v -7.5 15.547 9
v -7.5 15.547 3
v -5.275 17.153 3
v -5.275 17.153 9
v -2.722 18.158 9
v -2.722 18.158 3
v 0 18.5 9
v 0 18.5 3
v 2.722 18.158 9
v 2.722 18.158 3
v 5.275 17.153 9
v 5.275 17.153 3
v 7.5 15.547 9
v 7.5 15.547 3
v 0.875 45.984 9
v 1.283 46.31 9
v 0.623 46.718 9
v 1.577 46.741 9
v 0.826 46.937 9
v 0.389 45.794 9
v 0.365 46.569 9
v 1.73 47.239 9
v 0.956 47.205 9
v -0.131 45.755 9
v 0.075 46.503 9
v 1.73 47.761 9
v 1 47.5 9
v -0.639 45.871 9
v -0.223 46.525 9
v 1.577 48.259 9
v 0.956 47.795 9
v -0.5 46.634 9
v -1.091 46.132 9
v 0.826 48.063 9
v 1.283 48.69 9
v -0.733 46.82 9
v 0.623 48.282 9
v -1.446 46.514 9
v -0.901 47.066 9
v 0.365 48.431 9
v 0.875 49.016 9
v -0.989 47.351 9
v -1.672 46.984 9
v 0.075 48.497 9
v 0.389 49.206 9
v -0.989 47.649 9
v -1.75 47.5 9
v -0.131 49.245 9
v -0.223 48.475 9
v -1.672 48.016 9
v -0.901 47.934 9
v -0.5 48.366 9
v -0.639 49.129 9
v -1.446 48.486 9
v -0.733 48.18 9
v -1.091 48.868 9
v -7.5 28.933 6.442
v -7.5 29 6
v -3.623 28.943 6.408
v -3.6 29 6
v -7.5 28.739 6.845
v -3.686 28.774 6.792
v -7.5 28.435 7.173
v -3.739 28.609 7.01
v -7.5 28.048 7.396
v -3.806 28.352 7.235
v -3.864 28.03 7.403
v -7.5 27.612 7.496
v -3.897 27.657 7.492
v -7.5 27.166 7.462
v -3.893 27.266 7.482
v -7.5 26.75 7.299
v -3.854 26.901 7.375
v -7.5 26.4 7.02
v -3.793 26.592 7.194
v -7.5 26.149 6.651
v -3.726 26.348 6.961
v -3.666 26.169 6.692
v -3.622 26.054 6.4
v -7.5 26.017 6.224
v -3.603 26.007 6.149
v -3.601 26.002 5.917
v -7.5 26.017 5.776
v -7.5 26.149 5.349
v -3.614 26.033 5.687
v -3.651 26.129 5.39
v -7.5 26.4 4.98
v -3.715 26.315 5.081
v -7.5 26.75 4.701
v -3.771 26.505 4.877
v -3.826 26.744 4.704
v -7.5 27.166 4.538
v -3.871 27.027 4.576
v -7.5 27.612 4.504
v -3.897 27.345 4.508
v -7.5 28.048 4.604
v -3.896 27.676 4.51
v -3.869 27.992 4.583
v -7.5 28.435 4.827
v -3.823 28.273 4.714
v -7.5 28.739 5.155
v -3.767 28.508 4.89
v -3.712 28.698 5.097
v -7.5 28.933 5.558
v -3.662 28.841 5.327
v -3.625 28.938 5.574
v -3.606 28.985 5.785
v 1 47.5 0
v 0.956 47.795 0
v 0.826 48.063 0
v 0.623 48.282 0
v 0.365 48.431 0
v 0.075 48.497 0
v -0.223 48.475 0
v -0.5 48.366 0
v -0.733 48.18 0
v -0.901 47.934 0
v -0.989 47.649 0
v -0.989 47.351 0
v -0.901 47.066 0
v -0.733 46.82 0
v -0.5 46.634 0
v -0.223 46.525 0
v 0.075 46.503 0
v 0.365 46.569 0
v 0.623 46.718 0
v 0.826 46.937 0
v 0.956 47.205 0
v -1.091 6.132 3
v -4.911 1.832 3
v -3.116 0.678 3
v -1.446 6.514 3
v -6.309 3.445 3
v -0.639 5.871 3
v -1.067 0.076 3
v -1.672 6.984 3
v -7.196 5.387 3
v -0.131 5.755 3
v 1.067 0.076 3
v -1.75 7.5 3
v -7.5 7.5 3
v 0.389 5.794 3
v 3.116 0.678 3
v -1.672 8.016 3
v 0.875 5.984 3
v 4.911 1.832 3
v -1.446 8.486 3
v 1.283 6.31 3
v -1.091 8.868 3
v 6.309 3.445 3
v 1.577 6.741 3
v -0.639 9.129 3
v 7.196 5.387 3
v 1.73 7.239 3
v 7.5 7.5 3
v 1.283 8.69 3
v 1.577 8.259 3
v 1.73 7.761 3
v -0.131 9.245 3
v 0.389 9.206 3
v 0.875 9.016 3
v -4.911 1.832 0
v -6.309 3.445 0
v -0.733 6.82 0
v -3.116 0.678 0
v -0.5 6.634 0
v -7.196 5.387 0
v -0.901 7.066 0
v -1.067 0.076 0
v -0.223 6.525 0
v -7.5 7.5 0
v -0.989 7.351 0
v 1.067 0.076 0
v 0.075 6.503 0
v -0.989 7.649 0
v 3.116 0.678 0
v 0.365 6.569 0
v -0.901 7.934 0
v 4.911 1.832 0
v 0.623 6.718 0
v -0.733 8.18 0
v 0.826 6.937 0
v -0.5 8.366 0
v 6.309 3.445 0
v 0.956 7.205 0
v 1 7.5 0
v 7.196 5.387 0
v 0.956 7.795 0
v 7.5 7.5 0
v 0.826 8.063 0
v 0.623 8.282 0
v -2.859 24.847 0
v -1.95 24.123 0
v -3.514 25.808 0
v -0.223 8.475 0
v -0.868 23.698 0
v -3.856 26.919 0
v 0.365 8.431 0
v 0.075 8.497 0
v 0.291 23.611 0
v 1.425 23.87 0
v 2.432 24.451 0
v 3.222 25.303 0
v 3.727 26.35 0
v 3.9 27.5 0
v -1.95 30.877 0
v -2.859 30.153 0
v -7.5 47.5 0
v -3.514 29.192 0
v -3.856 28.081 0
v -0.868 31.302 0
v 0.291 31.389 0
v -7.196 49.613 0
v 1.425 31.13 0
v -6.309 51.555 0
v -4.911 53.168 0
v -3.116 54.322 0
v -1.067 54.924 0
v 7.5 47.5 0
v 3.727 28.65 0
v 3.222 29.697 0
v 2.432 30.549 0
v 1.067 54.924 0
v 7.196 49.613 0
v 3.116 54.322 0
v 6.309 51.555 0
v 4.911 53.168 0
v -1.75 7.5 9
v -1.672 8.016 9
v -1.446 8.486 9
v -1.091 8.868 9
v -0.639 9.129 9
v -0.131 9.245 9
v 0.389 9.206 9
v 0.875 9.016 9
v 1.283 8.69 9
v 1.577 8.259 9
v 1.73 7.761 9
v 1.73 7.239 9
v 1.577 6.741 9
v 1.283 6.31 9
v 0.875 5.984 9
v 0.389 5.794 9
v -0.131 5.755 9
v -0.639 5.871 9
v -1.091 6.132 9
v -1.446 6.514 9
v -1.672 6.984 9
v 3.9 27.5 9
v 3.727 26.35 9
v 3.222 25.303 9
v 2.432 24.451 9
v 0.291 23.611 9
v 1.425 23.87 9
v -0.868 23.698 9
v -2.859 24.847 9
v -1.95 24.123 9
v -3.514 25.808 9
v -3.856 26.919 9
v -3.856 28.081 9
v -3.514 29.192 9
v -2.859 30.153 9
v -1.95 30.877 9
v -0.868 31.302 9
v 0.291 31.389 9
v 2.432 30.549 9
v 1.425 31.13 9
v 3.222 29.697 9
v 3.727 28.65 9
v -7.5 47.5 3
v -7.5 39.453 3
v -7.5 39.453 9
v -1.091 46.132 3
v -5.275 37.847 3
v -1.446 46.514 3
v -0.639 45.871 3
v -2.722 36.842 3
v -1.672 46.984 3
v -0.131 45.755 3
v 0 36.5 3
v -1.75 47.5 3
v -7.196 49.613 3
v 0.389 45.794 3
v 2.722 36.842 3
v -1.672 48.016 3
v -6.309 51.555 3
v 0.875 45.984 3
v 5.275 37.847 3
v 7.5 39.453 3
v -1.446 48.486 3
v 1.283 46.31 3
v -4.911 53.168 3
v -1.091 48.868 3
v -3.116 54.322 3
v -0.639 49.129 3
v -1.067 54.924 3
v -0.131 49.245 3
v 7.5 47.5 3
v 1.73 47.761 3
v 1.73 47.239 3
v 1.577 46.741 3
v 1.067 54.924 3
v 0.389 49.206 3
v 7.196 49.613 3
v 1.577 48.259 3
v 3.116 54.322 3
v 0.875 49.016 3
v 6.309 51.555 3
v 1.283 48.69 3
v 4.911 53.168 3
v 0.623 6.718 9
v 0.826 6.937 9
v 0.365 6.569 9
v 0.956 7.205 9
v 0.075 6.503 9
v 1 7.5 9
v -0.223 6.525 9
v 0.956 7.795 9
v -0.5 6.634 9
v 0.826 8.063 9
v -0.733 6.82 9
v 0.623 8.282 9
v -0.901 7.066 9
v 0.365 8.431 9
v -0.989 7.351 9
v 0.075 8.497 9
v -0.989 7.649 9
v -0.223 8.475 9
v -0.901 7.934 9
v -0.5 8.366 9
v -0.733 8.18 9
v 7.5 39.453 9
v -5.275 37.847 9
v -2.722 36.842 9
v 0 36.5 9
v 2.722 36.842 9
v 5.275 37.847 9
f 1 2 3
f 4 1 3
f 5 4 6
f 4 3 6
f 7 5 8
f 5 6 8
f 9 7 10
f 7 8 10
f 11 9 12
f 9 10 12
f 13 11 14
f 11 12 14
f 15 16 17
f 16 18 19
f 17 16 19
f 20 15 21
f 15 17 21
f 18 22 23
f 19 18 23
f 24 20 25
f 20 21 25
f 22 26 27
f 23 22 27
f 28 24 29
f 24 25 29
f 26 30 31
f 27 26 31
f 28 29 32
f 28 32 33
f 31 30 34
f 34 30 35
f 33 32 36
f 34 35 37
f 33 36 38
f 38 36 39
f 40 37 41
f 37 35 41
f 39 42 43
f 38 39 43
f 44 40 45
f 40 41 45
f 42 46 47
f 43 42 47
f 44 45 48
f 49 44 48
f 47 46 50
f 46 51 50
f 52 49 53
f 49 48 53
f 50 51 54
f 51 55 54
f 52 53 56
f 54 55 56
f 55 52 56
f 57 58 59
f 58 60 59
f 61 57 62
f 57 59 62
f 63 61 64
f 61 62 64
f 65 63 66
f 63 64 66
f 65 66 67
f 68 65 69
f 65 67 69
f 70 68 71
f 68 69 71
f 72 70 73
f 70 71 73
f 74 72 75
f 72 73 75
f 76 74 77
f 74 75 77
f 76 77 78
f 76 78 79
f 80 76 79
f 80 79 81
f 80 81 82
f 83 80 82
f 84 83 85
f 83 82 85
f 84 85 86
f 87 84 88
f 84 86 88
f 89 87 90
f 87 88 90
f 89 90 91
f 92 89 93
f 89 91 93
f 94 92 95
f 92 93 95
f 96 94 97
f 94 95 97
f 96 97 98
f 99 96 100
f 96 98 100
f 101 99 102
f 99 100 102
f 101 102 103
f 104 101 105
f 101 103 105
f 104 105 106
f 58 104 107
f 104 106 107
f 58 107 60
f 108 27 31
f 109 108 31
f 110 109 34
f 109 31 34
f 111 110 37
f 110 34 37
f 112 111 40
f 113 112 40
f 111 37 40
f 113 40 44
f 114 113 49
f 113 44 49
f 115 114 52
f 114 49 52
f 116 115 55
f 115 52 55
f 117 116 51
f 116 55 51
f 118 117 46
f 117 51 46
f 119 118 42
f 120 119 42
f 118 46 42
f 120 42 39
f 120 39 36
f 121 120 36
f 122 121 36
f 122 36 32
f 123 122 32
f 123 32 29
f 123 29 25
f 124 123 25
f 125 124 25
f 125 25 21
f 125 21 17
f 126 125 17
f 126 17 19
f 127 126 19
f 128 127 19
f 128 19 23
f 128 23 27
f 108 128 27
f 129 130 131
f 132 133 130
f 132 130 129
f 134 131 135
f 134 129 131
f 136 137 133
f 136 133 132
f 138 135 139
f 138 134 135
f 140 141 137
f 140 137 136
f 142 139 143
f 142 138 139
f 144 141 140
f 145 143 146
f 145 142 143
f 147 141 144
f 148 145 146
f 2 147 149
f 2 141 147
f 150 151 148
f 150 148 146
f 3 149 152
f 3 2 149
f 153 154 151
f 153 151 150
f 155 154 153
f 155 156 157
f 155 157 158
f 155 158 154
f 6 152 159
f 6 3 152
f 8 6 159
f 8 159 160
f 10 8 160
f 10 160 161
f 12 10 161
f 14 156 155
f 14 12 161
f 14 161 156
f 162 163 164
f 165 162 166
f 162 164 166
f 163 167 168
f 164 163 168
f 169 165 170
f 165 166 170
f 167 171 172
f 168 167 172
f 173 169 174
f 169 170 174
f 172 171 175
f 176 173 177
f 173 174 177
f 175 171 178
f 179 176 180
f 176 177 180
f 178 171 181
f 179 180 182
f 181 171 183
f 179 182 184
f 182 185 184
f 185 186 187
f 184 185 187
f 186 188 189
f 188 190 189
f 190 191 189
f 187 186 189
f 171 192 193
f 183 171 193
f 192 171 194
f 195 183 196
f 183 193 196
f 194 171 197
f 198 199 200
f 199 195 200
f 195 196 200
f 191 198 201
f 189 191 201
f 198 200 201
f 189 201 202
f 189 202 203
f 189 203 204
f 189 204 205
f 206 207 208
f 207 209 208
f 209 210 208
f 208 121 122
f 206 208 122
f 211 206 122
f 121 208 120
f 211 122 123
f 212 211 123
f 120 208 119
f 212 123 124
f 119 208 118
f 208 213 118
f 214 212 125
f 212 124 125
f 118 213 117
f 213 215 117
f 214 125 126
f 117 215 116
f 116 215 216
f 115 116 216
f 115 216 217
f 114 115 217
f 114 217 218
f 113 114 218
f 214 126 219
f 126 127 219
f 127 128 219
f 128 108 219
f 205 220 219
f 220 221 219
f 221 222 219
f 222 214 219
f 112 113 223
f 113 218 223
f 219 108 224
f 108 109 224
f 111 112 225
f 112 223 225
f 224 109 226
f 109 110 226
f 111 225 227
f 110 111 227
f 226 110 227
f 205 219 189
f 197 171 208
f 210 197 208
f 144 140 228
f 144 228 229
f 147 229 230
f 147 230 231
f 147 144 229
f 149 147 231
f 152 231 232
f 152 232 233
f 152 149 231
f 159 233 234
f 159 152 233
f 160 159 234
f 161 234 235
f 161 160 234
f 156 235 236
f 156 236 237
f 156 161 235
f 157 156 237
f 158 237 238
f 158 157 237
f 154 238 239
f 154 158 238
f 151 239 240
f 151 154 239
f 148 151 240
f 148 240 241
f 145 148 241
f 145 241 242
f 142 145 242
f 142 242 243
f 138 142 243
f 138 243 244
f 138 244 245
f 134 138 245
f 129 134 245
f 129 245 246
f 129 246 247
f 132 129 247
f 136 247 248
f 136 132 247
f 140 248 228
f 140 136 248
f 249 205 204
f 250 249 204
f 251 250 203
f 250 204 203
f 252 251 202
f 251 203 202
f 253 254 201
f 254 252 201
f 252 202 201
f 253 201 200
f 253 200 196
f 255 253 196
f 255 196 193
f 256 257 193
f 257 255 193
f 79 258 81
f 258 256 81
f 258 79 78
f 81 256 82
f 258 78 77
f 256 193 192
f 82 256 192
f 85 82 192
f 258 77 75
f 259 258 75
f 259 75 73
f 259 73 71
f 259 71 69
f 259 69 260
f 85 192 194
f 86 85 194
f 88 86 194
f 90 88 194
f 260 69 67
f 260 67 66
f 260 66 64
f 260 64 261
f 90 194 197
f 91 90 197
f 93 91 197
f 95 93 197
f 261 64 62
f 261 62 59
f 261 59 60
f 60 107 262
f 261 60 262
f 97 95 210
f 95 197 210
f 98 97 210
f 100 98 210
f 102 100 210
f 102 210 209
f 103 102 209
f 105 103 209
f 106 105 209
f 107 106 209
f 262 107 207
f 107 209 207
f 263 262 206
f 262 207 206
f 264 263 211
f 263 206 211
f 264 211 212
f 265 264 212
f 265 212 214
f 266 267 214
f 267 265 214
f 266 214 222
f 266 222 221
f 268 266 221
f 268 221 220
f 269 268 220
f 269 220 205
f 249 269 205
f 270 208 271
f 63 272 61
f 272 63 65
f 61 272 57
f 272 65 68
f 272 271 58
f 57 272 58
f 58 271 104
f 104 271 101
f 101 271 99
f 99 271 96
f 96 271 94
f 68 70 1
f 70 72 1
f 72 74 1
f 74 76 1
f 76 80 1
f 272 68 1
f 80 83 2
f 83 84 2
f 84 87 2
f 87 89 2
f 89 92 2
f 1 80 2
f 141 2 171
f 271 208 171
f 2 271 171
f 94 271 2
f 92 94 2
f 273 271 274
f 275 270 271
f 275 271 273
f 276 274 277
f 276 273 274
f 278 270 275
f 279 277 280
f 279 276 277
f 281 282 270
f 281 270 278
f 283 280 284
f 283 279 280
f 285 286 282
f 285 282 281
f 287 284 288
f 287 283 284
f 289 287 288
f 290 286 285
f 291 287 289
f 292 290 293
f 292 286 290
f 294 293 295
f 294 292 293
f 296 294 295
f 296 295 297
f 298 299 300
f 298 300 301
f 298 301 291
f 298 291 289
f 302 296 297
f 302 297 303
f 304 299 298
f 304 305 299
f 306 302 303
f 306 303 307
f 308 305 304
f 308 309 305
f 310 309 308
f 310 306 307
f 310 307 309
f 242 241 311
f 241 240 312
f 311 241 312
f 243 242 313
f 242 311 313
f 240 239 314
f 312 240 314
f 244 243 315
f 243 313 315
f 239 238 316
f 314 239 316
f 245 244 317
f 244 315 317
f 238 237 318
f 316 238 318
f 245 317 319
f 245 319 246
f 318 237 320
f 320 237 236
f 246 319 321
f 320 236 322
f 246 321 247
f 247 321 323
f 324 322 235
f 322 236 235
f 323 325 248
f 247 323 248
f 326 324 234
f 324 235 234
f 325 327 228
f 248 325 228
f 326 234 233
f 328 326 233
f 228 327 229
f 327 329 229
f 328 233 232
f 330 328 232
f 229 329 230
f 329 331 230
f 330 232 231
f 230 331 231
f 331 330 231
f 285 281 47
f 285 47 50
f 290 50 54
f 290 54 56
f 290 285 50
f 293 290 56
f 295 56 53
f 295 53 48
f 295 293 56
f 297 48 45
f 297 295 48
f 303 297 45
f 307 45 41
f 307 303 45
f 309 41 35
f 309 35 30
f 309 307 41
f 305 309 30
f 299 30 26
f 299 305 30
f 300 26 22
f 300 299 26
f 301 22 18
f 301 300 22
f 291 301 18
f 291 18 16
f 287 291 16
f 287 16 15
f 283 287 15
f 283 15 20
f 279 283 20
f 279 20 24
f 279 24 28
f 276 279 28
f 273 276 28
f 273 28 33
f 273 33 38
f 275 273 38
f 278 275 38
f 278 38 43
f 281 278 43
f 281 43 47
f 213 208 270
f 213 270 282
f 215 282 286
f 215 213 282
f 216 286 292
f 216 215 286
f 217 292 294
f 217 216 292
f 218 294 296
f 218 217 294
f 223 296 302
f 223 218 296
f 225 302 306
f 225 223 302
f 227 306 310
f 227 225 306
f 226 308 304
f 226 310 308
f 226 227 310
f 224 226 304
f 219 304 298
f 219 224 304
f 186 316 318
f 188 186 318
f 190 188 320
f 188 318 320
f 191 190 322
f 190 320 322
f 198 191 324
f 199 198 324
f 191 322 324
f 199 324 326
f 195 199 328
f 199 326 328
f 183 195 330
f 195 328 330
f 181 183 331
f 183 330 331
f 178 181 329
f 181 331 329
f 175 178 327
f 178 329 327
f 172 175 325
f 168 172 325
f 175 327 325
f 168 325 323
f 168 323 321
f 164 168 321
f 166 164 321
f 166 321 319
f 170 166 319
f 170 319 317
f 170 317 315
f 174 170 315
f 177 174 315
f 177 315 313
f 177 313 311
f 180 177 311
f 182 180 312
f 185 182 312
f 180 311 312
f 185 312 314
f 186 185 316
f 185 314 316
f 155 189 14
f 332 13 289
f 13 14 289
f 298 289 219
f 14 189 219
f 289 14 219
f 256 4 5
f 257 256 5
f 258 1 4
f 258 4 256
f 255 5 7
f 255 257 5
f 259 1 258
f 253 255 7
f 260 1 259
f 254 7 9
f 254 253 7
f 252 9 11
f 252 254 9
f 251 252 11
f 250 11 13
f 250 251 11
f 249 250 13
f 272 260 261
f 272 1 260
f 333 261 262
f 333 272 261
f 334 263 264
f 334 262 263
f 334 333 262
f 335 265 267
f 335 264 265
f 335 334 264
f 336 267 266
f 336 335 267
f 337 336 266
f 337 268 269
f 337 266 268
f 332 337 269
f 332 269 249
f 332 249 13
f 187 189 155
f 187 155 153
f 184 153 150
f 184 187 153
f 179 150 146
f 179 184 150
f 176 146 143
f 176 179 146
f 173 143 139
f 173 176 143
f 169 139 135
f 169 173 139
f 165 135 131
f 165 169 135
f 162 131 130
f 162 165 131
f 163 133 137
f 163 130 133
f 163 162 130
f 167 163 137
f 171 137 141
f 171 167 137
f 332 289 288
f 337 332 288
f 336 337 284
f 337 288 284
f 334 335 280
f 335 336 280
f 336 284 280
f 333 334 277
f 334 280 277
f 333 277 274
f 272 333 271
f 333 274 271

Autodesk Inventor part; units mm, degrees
ref_plane "YZ Plane" through (0, 0, 0) normal (1, 0, 0) x (0, 1, 0)
ref_plane "XZ Plane" through (0, 0, 0) normal (0, 1, 0) x (-1, 0, 0)
ref_plane "XY Plane" through (0, 0, 0) normal (0, 0, 1) x (1, 0, 0)
sketch "Sketch1" plane through (0, 0, 0) normal (0, 0, 1) x (1, 0, 0)
  line L0 (0, 0) -> (0, 55) construction
  circle A0 centre (0, 47.5) radius 7.5 construction
  circle A1 centre (0, 7.5) radius 7.5 construction
  line L1 (7.5, 47.5) -> (7.5, 7.5)
  line L2 (-7.5, 7.5) -> (-7.5, 47.5)
  arc A2 (7.5, 47.5) -> (-7.5, 47.5) centre (0, 47.5) ccw
  arc A3 (-7.5, 7.5) -> (7.5, 7.5) centre (0, 7.5) ccw
  circle A4 centre (0, 27.5) radius 3.9
  circle A5 centre (0, 47.5) radius 1.75
  circle A6 centre (0, 7.5) radius 1.75
  dimension "d1" = 15
  dimension "d2" = 15
  dimension "d3" = 7.8
  dimension "d4" = 3.5
  dimension "d5" = 3.5
  dimension "d21" = 40
extrude "Extrusion1" add sketch "Sketch1" along normal blind 3
sketch "Sketch3" plane through (0, 0, 0) normal (0, 0, -1) x (-1, 0, 0)
  circle A0 centre (0, 47.5) radius 1.75 projected
  circle A1 centre (0, 7.5) radius 1.75 projected
  point P0 (0, 0)
extrude "Extrusion2" add sketch "Sketch3" against normal blind 9
sketch "Sketch4" plane through (0, 47.5, 9) normal (0, 0, 1) x (1, 0, 0)
  circle A0 centre (0, 0) radius 1.75 projected
  circle A1 centre (0, -40) radius 1.75 projected
  circle A2 centre (0, 0) radius 1
  circle A3 centre (0, -40) radius 1
  point P0 (0, -47.5)
  dimension "d10" = 2
  dimension "d11" = 2
extrude "Extrusion3" cut sketch "Sketch4" against normal through all contours A2 | A3
sketch "Sketch5" plane through (0, 0, 3) normal (0, 0, 1) x (1, 0, 0)
  arc A0 (7.5, 47.5) -> (-7.5, 47.5) centre (0, 47.5) ccw projected
  arc A1 (-7.5, 7.5) -> (7.5, 7.5) centre (0, 7.5) ccw projected
  circle A2 centre (0, 47.5) radius 1 projected
  circle A3 centre (0, 47.5) radius 11 construction
  circle A4 centre (0, 7.5) radius 11 construction
  line L0 (7.5, 7.5) -> (7.5, 47.5) projected
  line L1 (7.5, 39.4533) -> (7.5, 15.5467)
  line L2 (-7.5, 47.5) -> (-7.5, 7.5) projected
  line L3 (-7.5, 39.4533) -> (-7.5, 15.5467)
  arc A5 (-7.5, 39.4533) -> (7.5, 39.4533) centre (0, 47.5) ccw
  arc A6 (7.5, 15.5467) -> (-7.5, 15.5467) centre (0, 7.5) ccw
  circle A7 centre (0, 27.5) radius 3.9 projected
  point P0 (0, 0)
  dimension "d14" = 22
  dimension "d15" = 22
extrude "Extrusion4" add sketch "Sketch5" along normal blind 6 contours L0 A6 L2 A5
sketch "Sketch6" plane through (0, 0, 0) normal (1, 0, 0) x (0, 1, 0)
  line L0 (7.5, 0) -> (47.5, 0) projected
  line L1 (7.5, 0) -> (7.5, 3) projected
  line L2 (15.5467, 3) -> (7.5, 3) projected
  line L3 (15.5467, 3) -> (15.5467, 9) projected
  line L4 (39.4533, 9) -> (15.5467, 9) projected
  line L5 (39.4533, 3) -> (39.4533, 9) projected
  line L6 (47.5, 0) -> (47.5, 3) projected
  circle A0 centre (27.5, 6) radius 1.5
  line L7 (47.5, 3) -> (39.4533, 3) projected
  point P0 (0, 0)
  point P1 (27.5, 9)
  point P2 (39.4533, 6)
  dimension "d18" = 3
extrude "Extrusion5" cut sketch "Sketch6" against normal through all contours A0
equation "\"d5\" = d4"
equation "\"d15\" = d14"
properties part number "WaveGenerator" material "ABS Plastic"
